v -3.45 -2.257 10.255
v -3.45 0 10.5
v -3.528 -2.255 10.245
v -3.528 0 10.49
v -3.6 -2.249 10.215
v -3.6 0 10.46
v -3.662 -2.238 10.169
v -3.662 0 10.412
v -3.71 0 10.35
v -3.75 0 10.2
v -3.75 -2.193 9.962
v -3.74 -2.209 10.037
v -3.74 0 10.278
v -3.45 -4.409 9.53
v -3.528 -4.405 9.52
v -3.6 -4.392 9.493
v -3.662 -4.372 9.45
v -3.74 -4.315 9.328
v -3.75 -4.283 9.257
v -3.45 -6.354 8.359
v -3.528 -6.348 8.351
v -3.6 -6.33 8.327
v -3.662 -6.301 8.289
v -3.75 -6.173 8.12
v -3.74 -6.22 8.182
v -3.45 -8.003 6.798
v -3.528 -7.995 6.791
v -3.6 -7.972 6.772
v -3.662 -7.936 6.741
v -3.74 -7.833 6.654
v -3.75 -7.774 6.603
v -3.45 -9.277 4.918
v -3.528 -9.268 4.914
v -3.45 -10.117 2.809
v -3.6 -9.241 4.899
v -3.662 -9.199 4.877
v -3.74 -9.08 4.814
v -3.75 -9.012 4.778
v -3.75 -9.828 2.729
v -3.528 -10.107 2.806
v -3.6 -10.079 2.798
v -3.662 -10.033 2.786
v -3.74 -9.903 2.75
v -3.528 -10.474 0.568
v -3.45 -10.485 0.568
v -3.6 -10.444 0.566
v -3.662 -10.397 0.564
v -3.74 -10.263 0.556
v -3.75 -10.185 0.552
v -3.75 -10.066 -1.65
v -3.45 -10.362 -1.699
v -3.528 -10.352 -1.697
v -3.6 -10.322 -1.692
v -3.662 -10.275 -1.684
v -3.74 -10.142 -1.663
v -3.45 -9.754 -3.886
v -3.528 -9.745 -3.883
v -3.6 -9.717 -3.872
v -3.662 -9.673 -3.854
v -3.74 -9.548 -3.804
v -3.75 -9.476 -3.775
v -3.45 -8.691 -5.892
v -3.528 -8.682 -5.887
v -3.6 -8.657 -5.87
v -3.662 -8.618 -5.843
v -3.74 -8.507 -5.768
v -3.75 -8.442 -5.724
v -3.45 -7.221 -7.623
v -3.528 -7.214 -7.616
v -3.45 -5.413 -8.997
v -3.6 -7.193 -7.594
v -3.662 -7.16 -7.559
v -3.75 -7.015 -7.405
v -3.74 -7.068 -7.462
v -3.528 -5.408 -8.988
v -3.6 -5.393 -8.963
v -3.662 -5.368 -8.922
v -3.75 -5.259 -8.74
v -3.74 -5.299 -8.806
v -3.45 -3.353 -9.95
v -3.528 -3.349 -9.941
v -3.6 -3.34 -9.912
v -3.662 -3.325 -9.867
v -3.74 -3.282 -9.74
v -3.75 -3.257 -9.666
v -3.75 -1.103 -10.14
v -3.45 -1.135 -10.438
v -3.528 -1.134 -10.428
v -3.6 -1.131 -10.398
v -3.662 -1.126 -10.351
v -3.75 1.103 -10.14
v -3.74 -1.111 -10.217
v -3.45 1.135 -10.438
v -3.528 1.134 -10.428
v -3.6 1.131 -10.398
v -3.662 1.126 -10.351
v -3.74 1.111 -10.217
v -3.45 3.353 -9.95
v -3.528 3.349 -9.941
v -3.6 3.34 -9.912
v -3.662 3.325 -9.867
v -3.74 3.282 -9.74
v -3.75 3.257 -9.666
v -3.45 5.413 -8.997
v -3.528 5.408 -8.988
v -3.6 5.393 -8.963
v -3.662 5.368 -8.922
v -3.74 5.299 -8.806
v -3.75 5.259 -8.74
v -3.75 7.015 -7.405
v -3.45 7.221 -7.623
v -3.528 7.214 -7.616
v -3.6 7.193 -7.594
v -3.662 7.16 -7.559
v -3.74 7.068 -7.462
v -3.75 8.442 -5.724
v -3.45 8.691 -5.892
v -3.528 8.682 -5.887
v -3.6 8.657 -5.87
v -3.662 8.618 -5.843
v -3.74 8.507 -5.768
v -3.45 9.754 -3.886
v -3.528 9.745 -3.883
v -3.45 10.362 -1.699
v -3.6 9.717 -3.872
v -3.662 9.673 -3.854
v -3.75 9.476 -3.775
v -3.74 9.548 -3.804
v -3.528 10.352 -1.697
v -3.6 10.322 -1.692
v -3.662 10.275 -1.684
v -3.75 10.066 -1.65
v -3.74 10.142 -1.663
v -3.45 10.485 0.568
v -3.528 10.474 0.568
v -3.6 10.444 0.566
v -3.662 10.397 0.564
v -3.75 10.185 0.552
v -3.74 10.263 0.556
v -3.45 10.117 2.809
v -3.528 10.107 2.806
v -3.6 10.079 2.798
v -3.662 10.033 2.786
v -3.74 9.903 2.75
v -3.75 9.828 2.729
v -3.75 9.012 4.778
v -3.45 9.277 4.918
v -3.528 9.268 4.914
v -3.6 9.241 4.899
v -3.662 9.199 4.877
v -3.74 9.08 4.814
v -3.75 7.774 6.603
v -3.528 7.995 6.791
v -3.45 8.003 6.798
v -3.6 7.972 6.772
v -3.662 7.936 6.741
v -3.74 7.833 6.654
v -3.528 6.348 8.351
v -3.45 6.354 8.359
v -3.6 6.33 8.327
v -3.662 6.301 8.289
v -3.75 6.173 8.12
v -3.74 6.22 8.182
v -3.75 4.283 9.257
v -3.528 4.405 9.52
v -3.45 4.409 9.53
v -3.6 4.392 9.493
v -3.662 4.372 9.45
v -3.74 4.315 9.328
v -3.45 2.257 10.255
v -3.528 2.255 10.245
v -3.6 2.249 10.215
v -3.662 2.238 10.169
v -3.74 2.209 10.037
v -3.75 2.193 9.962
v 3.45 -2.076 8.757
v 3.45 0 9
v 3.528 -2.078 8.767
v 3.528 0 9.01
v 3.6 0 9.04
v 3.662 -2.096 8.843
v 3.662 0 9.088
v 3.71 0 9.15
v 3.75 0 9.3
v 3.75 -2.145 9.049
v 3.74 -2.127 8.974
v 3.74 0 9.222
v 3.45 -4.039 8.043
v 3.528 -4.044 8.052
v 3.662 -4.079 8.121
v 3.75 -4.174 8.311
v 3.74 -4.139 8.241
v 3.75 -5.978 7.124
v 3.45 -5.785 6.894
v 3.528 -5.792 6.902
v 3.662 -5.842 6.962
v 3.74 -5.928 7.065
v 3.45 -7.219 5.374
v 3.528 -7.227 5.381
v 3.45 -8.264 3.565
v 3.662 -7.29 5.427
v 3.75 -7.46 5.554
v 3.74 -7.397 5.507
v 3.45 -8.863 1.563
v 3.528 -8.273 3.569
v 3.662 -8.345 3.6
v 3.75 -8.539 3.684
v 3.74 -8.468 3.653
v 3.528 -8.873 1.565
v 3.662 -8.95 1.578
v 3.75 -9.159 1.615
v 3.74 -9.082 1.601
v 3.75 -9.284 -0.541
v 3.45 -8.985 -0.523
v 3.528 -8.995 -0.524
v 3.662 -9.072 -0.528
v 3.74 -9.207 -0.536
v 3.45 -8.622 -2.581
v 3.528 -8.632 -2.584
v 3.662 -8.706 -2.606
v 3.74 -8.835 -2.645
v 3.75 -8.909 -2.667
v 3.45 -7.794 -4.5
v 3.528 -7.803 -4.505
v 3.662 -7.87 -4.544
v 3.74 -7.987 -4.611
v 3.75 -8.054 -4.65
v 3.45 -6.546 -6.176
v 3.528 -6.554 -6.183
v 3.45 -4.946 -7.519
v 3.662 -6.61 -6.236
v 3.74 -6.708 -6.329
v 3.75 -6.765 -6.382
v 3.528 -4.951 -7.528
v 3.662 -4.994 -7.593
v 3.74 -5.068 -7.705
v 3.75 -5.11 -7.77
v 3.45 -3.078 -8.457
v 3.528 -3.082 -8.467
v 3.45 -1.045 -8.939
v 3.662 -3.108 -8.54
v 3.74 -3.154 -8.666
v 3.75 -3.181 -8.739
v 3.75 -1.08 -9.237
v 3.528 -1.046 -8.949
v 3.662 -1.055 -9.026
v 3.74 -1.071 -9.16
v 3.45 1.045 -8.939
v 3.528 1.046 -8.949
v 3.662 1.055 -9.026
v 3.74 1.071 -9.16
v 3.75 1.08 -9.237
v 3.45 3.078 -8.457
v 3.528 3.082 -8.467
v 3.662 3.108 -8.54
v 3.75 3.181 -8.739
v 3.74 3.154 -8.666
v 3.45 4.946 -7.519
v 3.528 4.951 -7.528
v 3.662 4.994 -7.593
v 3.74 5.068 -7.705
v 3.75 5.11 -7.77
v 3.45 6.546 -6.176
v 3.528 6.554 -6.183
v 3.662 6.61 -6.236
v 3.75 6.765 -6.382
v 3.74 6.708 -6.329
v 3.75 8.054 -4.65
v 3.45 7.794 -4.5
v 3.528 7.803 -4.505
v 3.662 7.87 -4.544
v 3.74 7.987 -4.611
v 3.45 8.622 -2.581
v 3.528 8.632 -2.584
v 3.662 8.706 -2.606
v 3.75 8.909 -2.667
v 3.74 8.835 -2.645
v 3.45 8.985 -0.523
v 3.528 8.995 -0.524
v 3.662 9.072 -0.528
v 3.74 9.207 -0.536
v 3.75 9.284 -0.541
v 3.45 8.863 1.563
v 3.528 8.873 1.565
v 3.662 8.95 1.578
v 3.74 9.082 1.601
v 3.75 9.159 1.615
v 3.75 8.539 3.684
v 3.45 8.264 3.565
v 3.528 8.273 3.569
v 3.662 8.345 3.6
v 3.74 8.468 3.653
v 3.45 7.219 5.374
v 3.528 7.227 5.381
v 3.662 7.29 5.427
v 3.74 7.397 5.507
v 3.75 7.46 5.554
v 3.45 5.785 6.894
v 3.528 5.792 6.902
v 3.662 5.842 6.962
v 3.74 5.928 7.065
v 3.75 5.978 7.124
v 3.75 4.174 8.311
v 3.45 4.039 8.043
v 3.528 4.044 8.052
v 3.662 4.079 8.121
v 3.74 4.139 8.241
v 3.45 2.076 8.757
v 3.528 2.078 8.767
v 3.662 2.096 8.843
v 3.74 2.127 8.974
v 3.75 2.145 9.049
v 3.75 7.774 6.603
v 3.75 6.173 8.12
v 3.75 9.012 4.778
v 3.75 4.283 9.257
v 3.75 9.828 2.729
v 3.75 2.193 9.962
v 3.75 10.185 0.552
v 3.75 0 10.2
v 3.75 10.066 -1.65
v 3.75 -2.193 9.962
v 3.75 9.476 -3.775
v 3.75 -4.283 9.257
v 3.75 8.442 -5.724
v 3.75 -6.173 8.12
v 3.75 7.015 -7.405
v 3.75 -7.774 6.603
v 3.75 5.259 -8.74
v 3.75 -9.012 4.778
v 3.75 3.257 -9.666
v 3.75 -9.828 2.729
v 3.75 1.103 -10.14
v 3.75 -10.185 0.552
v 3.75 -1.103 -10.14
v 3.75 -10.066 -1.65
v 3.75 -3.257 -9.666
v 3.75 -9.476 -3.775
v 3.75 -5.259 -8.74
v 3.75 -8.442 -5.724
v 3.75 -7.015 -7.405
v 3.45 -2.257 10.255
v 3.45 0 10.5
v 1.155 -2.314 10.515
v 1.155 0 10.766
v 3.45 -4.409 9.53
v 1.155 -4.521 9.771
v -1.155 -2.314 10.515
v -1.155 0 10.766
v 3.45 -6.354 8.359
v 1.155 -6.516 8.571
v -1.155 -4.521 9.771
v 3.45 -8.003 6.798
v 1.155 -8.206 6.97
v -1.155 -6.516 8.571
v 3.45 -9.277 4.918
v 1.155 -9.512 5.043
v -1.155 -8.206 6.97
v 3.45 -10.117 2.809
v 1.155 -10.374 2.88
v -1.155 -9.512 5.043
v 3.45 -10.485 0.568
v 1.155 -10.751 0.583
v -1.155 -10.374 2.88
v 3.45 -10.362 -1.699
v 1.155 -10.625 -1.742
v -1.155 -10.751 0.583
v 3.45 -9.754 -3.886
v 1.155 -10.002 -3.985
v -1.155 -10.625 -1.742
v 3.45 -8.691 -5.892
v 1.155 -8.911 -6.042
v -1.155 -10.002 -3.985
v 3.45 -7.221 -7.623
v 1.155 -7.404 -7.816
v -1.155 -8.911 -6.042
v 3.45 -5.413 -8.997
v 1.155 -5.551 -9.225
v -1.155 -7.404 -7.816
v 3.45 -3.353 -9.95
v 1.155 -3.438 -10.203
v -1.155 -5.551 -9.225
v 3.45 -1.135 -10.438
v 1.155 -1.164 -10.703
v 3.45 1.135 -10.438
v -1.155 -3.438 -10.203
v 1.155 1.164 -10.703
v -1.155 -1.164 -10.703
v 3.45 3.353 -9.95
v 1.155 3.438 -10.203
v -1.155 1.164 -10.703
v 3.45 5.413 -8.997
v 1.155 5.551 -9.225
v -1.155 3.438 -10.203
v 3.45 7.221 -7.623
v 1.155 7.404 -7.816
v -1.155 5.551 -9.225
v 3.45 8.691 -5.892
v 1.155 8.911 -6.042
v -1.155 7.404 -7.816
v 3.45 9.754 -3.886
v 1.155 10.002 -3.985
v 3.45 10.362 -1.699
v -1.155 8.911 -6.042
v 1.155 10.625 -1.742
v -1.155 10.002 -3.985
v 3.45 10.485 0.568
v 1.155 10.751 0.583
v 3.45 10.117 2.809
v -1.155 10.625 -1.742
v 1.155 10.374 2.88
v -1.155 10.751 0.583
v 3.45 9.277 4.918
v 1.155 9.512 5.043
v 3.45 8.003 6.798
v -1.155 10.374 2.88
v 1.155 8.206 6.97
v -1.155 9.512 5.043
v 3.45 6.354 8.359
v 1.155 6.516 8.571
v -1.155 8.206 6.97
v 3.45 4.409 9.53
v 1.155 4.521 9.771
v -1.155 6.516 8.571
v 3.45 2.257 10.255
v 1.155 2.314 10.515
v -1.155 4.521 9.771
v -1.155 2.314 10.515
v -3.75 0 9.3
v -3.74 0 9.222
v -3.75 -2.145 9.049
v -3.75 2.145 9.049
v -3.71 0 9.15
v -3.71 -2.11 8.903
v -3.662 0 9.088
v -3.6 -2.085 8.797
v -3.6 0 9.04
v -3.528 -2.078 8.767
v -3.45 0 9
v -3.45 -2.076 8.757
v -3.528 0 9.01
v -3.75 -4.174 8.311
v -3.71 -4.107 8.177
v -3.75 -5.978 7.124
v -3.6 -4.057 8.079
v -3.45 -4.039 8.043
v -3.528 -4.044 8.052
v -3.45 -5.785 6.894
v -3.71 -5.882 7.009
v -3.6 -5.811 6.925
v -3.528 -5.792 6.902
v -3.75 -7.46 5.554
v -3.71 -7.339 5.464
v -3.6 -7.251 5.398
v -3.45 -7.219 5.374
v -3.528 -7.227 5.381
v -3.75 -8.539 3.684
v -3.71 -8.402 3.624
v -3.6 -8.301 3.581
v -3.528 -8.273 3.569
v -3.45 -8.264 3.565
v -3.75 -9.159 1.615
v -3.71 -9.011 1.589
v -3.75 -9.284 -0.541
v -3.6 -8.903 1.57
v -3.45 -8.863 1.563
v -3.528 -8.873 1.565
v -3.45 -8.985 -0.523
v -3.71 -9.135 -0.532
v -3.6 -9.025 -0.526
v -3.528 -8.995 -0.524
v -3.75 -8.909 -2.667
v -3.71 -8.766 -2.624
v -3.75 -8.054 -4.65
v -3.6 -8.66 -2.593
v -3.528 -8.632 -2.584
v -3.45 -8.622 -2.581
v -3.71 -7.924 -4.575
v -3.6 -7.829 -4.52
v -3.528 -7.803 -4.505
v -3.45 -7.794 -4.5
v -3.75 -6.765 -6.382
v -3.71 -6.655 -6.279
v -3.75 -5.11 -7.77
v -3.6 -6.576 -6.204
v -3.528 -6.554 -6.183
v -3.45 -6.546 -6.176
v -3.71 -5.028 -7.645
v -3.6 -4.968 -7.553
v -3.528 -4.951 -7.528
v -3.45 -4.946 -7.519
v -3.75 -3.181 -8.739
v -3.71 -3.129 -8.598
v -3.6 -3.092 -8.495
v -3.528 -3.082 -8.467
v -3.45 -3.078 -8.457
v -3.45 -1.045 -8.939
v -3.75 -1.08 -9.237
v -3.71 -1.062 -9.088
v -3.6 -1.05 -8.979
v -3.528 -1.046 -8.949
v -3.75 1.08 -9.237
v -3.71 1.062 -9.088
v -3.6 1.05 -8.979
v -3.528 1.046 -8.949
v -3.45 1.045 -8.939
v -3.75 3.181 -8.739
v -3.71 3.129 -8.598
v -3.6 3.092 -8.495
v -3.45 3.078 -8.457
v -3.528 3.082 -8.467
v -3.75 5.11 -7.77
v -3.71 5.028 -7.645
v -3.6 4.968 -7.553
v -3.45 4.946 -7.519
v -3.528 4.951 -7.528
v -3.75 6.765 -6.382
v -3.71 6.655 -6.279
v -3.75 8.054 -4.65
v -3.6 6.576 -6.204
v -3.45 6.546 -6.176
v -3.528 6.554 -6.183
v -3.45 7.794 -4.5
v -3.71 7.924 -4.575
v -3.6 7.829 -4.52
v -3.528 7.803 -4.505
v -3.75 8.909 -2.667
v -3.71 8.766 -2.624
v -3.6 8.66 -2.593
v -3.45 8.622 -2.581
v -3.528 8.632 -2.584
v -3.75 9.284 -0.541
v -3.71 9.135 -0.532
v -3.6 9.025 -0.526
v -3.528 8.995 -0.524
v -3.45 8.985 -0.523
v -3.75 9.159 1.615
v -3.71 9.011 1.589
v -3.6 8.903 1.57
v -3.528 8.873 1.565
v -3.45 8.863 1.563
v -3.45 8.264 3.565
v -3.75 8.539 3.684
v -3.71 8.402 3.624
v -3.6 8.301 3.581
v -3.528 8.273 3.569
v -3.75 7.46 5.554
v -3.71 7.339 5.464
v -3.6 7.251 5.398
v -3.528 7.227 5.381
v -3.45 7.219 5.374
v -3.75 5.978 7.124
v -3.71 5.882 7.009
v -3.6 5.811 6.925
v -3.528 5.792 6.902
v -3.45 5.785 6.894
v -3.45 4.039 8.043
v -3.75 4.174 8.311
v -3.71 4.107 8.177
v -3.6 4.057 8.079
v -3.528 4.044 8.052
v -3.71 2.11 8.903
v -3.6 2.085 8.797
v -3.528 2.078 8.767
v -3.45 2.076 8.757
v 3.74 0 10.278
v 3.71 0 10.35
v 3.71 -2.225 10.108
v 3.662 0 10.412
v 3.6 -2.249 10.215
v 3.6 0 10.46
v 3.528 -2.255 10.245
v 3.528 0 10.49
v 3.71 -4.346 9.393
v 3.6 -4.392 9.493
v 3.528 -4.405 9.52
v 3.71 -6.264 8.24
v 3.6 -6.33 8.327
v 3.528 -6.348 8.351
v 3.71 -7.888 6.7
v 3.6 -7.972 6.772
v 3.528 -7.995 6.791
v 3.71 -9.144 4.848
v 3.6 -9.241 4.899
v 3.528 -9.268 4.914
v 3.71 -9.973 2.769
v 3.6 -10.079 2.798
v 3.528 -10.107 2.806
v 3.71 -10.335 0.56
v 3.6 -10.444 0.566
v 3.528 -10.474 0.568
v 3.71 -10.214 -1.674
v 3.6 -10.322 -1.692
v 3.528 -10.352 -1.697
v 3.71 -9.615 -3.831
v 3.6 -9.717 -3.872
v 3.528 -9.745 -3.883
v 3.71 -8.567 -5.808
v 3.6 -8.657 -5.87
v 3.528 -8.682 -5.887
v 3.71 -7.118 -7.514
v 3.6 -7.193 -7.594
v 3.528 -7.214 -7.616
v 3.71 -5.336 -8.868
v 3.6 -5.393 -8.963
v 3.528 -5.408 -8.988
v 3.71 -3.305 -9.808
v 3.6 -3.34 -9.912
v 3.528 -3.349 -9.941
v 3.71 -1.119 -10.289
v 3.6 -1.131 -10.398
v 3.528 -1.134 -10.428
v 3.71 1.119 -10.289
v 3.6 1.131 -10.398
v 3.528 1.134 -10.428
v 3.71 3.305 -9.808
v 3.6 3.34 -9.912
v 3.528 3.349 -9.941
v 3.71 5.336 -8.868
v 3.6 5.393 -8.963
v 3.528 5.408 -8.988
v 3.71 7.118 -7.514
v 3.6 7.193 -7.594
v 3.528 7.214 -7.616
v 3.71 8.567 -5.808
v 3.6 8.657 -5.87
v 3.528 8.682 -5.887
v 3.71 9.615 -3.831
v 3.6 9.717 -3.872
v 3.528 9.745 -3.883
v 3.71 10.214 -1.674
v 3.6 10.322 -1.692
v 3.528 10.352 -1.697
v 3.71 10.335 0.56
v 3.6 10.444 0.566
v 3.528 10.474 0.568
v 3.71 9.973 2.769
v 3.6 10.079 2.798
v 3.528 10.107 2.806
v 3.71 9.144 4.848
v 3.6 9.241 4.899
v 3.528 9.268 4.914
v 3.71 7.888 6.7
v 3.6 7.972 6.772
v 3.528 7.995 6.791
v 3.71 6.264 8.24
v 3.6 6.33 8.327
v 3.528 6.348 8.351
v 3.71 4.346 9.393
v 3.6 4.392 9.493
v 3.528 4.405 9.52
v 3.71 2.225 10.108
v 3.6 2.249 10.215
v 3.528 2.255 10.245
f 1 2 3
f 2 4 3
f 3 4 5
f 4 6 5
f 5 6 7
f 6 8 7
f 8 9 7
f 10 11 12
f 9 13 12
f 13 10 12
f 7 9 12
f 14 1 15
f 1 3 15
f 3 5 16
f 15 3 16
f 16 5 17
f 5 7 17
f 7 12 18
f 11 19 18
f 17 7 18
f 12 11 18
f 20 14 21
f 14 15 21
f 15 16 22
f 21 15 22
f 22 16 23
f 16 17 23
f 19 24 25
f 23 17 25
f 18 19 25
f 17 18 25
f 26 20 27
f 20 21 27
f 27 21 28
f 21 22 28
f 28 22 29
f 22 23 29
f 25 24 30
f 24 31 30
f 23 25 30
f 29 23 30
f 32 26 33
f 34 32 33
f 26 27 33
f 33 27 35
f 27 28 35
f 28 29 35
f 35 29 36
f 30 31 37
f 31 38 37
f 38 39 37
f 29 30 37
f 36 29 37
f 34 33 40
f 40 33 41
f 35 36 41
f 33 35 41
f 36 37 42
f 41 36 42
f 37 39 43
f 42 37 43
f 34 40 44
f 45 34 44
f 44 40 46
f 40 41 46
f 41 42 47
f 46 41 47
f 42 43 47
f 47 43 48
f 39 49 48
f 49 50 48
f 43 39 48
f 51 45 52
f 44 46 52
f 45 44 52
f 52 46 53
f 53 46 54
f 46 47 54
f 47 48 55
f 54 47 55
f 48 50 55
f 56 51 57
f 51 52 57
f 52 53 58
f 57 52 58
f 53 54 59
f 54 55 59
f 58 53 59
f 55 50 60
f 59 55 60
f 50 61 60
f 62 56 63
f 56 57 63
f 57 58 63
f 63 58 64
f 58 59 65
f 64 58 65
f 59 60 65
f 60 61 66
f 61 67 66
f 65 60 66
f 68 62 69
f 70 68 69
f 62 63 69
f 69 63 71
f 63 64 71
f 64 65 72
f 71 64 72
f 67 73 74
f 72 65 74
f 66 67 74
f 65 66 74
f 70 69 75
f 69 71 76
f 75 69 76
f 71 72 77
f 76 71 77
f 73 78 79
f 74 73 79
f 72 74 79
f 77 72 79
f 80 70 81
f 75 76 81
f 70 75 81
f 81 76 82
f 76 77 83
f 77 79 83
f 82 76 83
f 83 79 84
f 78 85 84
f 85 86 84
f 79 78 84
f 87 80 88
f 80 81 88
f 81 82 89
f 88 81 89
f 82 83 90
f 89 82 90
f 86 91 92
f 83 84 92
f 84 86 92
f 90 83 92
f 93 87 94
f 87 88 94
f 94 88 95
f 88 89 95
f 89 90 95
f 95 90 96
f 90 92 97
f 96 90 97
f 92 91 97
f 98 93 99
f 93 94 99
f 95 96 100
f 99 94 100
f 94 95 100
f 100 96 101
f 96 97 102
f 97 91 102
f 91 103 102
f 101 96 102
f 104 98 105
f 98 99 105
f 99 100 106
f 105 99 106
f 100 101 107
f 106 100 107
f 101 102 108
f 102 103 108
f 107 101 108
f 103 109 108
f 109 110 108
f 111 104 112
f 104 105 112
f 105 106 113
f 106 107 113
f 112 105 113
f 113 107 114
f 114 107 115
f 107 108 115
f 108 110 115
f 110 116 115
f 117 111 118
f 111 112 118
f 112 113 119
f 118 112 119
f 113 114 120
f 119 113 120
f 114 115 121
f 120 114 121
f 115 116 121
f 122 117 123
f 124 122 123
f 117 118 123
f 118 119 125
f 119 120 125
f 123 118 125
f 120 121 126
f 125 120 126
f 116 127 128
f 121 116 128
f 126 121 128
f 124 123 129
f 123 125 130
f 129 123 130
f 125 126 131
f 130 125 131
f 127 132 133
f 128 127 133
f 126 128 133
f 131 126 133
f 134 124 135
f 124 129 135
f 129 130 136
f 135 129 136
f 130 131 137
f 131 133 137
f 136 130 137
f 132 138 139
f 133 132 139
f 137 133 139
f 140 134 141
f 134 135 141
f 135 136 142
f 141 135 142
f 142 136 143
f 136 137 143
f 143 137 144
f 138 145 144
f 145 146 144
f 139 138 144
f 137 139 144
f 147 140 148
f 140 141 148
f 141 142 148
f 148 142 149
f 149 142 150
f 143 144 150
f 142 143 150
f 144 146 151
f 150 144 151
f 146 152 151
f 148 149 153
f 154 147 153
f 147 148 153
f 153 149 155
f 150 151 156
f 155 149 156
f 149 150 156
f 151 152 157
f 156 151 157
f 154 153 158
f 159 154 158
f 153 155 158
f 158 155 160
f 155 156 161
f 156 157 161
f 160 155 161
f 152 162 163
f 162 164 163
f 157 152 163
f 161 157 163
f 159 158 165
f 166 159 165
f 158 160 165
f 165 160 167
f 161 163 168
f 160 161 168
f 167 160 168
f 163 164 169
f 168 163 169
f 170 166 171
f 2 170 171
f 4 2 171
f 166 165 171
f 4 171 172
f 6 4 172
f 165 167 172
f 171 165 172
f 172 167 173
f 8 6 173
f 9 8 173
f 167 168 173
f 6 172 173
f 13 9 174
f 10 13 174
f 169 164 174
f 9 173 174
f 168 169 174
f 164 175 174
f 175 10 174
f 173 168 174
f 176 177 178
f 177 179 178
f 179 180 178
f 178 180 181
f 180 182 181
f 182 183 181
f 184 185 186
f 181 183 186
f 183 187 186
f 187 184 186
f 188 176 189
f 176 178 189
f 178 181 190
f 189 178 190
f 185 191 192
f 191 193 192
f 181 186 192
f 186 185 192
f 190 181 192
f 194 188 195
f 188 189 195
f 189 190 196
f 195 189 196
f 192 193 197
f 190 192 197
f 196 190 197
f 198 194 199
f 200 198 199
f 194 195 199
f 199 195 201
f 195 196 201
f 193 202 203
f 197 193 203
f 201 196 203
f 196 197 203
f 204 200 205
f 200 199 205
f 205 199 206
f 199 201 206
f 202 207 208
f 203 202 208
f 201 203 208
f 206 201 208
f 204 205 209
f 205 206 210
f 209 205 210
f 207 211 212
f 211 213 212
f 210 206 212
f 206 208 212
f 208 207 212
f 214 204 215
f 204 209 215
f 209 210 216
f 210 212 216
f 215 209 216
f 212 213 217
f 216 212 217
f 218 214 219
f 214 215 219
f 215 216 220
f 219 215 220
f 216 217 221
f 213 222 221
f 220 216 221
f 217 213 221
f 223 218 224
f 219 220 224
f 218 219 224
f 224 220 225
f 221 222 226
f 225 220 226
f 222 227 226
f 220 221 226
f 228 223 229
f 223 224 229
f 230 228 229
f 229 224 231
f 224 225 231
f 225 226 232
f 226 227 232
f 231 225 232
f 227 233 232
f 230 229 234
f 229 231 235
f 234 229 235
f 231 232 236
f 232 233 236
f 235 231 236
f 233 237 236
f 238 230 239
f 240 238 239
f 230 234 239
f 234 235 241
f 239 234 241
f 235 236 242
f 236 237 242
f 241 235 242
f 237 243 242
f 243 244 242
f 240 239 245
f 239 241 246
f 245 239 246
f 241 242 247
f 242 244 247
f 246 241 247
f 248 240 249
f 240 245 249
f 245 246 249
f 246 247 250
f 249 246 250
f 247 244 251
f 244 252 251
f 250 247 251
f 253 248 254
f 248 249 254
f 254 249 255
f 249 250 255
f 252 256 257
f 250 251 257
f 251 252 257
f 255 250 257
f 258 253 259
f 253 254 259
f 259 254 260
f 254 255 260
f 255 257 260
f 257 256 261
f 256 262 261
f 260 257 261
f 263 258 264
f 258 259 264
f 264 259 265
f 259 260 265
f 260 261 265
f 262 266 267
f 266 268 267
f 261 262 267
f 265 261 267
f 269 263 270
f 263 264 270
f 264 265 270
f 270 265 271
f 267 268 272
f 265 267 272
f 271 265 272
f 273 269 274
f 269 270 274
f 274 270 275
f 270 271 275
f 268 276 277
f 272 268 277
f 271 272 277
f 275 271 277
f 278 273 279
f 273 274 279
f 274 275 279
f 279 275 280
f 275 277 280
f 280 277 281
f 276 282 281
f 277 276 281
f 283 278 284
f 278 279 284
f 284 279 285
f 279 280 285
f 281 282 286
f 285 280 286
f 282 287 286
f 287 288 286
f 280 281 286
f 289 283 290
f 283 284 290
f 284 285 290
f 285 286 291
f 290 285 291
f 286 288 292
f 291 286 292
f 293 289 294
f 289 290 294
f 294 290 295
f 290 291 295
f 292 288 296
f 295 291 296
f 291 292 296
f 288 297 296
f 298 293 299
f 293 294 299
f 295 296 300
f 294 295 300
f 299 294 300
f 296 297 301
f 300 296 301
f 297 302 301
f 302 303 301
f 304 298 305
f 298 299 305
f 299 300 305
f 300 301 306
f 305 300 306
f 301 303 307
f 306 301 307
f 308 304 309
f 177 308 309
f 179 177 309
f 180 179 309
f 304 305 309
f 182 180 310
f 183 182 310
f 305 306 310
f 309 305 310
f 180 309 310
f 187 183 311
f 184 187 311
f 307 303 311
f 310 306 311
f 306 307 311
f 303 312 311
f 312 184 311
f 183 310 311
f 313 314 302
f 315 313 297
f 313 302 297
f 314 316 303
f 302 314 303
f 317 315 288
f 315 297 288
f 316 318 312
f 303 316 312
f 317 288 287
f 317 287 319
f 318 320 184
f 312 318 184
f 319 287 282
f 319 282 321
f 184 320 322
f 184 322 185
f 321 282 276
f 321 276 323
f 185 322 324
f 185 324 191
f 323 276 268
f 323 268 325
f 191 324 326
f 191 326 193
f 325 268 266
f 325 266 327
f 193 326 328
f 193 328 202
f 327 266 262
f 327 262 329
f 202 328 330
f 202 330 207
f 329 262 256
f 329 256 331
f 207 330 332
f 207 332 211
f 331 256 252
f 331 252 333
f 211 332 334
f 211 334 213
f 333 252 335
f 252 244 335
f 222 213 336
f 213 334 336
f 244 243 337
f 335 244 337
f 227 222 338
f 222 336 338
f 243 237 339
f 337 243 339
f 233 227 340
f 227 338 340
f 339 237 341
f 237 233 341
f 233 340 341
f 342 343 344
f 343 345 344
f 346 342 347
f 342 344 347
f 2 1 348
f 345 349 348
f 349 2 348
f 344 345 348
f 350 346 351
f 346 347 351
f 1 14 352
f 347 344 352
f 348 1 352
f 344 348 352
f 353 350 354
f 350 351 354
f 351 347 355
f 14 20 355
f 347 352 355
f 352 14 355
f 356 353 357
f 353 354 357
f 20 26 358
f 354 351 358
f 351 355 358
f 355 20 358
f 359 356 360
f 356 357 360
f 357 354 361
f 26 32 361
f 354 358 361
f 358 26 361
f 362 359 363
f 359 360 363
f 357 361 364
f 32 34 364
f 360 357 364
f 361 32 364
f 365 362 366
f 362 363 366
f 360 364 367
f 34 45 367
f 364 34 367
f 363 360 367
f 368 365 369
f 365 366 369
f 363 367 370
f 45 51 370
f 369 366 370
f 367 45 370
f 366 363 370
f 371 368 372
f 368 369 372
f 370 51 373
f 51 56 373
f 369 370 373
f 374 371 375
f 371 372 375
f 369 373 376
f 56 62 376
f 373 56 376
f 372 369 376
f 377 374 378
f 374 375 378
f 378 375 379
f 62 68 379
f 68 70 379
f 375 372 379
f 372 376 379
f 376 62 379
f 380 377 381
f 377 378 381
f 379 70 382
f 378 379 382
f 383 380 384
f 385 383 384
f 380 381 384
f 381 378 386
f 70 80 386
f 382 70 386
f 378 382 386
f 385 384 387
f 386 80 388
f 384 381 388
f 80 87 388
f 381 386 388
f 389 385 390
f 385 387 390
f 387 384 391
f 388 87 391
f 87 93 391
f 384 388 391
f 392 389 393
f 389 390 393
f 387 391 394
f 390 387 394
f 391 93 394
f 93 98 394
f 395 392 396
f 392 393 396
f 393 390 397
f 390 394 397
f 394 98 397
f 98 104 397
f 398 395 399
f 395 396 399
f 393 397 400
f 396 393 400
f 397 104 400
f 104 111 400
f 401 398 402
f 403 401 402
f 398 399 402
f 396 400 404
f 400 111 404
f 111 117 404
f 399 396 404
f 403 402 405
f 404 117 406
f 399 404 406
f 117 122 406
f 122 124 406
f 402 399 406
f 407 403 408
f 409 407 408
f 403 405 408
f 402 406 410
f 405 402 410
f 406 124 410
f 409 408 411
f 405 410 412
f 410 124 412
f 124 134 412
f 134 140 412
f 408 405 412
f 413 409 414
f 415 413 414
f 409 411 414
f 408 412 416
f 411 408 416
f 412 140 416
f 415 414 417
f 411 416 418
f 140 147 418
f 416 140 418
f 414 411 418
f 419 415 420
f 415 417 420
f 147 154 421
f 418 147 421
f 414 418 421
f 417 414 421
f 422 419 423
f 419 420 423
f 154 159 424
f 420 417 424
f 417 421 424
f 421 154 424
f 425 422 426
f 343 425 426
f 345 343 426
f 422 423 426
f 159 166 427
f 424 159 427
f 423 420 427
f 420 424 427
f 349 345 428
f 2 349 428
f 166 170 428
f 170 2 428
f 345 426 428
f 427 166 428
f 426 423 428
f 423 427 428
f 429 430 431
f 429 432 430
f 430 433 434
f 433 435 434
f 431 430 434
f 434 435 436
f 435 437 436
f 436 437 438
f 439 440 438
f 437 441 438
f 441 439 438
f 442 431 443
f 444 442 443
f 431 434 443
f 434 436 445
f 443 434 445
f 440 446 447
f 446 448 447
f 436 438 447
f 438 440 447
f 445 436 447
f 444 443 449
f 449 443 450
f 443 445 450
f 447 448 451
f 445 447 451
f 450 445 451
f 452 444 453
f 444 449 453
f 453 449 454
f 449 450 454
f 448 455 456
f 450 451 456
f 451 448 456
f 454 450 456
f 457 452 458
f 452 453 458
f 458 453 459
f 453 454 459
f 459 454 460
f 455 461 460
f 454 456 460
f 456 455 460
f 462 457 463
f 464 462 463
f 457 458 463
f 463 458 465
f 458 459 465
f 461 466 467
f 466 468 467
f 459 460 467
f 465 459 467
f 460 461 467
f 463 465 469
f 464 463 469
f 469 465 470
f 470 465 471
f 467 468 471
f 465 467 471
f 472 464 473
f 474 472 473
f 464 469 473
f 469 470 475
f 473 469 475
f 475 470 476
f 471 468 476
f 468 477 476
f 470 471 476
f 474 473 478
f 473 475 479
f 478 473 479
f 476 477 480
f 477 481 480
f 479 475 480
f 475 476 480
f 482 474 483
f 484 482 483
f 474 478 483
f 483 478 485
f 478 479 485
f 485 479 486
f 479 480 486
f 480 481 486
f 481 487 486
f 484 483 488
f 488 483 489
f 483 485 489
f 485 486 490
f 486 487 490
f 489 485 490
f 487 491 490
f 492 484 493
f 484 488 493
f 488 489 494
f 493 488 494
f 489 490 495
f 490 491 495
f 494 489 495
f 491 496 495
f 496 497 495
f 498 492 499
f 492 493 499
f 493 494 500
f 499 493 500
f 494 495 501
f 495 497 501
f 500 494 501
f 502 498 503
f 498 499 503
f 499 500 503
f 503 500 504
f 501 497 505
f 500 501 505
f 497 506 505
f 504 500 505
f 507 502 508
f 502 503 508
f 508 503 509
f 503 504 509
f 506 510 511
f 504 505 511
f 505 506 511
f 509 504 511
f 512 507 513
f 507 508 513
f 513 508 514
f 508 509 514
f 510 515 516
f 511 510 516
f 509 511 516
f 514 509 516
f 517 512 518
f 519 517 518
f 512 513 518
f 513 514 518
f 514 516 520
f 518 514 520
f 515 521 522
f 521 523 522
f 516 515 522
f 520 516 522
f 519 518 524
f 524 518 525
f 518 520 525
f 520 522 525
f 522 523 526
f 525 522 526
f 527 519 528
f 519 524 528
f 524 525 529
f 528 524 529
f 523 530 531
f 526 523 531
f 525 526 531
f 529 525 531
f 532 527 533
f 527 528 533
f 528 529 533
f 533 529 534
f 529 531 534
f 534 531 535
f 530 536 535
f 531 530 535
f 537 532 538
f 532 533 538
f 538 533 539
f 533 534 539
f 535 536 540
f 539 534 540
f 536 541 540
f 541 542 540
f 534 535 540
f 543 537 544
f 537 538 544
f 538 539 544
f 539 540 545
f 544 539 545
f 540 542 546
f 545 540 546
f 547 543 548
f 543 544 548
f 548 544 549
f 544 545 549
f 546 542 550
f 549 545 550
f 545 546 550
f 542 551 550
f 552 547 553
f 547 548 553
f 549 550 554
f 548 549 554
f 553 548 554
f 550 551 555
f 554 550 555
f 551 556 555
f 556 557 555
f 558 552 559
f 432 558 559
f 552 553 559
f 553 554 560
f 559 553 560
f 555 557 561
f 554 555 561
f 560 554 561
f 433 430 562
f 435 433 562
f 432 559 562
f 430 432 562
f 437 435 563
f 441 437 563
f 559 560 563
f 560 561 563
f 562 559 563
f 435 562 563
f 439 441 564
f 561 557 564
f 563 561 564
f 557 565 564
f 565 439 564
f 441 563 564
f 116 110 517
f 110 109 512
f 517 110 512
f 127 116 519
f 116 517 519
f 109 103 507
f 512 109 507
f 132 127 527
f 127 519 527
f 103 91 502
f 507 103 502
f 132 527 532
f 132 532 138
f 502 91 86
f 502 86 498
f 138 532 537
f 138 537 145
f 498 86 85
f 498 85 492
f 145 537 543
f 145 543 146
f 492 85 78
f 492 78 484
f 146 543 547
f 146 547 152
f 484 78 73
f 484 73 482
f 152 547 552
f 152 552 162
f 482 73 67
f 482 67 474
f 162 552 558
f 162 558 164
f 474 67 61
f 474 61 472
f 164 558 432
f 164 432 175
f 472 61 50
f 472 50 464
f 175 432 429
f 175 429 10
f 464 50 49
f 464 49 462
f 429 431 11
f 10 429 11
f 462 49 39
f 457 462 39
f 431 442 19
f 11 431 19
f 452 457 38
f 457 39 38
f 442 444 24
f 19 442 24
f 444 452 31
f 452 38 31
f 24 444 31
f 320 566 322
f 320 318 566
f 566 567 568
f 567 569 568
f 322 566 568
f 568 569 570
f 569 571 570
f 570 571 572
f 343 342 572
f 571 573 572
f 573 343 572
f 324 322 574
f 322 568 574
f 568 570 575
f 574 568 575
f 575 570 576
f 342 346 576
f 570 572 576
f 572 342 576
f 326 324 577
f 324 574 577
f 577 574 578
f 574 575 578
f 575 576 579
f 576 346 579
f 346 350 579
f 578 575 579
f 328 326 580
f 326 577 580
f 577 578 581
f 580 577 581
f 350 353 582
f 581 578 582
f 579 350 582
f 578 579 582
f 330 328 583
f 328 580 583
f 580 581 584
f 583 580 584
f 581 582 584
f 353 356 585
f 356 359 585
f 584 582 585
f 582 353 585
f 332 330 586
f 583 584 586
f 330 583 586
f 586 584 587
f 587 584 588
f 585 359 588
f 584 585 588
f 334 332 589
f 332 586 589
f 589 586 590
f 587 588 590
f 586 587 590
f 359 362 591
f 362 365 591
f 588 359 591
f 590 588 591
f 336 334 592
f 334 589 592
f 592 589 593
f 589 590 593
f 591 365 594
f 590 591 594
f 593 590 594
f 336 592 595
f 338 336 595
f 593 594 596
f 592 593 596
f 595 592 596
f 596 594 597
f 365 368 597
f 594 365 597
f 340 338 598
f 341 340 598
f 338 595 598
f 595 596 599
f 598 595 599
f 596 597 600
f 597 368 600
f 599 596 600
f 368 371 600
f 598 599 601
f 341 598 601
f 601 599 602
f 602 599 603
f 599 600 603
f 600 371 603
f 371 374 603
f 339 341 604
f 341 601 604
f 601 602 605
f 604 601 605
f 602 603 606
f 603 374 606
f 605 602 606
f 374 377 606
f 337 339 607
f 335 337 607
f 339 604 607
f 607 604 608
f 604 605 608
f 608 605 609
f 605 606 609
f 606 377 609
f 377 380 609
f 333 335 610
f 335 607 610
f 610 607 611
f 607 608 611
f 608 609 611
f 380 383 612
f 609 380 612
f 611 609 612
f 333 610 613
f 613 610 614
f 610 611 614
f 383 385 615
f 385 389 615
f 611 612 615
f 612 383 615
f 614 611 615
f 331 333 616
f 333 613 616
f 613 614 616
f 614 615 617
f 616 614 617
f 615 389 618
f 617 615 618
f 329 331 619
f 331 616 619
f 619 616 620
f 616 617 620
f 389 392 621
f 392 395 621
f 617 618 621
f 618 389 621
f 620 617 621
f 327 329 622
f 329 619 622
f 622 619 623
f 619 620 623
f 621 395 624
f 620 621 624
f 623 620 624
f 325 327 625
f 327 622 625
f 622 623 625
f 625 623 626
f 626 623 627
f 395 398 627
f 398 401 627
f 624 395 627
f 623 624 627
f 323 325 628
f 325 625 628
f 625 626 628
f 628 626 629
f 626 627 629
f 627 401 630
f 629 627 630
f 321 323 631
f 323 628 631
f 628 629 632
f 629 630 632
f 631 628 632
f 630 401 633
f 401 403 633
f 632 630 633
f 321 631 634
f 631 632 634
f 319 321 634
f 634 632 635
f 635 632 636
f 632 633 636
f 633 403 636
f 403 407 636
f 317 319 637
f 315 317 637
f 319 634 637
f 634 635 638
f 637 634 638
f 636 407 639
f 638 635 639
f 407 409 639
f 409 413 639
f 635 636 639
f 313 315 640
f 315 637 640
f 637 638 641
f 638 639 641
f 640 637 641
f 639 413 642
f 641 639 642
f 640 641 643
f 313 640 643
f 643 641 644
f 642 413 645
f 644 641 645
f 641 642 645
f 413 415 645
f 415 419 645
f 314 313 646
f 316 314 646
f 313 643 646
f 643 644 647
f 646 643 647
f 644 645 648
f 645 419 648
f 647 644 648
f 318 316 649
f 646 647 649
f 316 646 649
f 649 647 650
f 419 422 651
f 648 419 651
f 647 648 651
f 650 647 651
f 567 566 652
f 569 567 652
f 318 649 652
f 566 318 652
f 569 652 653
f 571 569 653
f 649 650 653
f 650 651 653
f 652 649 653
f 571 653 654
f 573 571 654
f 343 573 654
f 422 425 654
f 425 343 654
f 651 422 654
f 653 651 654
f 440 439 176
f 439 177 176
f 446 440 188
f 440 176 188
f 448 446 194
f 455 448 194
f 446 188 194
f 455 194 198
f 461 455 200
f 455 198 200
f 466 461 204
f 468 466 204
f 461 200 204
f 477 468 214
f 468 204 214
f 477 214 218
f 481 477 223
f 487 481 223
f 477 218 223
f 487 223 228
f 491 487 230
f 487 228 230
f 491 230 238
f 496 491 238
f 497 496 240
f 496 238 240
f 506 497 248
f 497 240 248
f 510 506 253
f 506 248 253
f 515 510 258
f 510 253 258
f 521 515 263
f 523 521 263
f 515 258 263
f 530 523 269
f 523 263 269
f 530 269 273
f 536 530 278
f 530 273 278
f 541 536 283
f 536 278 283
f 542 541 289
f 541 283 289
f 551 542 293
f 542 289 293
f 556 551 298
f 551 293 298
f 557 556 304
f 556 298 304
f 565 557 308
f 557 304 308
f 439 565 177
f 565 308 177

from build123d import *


with BuildPart() as f1:
    # F0 (on Front) → F1 (revolve)
    with BuildSketch(Plane.XZ):
        with BuildLine():
            ThreePointArc((-3.75, 9.3), (-3.662132, 9.087868), (-3.45, 9))
            Line((-3.45, 9), (3.45, 9))
            ThreePointArc((3.45, 9), (3.662132, 9.087868), (3.75, 9.3))
            Line((3.75, 9.3), (3.75, 10.2))
            ThreePointArc((3.75, 10.2), (3.662132, 10.412132), (3.45, 10.5))
            ThreePointArc((3.45, 10.5), (0, 10.79981), (-3.45, 10.5))
            ThreePointArc((-3.45, 10.5), (-3.662132, 10.412132), (-3.75, 10.2))
            Line((-3.75, 10.2), (-3.75, 9.3))
        make_face()
    revolve(axis=Axis((2.5, 0, 0), (1, 0, 0)))


solid = f1.part
